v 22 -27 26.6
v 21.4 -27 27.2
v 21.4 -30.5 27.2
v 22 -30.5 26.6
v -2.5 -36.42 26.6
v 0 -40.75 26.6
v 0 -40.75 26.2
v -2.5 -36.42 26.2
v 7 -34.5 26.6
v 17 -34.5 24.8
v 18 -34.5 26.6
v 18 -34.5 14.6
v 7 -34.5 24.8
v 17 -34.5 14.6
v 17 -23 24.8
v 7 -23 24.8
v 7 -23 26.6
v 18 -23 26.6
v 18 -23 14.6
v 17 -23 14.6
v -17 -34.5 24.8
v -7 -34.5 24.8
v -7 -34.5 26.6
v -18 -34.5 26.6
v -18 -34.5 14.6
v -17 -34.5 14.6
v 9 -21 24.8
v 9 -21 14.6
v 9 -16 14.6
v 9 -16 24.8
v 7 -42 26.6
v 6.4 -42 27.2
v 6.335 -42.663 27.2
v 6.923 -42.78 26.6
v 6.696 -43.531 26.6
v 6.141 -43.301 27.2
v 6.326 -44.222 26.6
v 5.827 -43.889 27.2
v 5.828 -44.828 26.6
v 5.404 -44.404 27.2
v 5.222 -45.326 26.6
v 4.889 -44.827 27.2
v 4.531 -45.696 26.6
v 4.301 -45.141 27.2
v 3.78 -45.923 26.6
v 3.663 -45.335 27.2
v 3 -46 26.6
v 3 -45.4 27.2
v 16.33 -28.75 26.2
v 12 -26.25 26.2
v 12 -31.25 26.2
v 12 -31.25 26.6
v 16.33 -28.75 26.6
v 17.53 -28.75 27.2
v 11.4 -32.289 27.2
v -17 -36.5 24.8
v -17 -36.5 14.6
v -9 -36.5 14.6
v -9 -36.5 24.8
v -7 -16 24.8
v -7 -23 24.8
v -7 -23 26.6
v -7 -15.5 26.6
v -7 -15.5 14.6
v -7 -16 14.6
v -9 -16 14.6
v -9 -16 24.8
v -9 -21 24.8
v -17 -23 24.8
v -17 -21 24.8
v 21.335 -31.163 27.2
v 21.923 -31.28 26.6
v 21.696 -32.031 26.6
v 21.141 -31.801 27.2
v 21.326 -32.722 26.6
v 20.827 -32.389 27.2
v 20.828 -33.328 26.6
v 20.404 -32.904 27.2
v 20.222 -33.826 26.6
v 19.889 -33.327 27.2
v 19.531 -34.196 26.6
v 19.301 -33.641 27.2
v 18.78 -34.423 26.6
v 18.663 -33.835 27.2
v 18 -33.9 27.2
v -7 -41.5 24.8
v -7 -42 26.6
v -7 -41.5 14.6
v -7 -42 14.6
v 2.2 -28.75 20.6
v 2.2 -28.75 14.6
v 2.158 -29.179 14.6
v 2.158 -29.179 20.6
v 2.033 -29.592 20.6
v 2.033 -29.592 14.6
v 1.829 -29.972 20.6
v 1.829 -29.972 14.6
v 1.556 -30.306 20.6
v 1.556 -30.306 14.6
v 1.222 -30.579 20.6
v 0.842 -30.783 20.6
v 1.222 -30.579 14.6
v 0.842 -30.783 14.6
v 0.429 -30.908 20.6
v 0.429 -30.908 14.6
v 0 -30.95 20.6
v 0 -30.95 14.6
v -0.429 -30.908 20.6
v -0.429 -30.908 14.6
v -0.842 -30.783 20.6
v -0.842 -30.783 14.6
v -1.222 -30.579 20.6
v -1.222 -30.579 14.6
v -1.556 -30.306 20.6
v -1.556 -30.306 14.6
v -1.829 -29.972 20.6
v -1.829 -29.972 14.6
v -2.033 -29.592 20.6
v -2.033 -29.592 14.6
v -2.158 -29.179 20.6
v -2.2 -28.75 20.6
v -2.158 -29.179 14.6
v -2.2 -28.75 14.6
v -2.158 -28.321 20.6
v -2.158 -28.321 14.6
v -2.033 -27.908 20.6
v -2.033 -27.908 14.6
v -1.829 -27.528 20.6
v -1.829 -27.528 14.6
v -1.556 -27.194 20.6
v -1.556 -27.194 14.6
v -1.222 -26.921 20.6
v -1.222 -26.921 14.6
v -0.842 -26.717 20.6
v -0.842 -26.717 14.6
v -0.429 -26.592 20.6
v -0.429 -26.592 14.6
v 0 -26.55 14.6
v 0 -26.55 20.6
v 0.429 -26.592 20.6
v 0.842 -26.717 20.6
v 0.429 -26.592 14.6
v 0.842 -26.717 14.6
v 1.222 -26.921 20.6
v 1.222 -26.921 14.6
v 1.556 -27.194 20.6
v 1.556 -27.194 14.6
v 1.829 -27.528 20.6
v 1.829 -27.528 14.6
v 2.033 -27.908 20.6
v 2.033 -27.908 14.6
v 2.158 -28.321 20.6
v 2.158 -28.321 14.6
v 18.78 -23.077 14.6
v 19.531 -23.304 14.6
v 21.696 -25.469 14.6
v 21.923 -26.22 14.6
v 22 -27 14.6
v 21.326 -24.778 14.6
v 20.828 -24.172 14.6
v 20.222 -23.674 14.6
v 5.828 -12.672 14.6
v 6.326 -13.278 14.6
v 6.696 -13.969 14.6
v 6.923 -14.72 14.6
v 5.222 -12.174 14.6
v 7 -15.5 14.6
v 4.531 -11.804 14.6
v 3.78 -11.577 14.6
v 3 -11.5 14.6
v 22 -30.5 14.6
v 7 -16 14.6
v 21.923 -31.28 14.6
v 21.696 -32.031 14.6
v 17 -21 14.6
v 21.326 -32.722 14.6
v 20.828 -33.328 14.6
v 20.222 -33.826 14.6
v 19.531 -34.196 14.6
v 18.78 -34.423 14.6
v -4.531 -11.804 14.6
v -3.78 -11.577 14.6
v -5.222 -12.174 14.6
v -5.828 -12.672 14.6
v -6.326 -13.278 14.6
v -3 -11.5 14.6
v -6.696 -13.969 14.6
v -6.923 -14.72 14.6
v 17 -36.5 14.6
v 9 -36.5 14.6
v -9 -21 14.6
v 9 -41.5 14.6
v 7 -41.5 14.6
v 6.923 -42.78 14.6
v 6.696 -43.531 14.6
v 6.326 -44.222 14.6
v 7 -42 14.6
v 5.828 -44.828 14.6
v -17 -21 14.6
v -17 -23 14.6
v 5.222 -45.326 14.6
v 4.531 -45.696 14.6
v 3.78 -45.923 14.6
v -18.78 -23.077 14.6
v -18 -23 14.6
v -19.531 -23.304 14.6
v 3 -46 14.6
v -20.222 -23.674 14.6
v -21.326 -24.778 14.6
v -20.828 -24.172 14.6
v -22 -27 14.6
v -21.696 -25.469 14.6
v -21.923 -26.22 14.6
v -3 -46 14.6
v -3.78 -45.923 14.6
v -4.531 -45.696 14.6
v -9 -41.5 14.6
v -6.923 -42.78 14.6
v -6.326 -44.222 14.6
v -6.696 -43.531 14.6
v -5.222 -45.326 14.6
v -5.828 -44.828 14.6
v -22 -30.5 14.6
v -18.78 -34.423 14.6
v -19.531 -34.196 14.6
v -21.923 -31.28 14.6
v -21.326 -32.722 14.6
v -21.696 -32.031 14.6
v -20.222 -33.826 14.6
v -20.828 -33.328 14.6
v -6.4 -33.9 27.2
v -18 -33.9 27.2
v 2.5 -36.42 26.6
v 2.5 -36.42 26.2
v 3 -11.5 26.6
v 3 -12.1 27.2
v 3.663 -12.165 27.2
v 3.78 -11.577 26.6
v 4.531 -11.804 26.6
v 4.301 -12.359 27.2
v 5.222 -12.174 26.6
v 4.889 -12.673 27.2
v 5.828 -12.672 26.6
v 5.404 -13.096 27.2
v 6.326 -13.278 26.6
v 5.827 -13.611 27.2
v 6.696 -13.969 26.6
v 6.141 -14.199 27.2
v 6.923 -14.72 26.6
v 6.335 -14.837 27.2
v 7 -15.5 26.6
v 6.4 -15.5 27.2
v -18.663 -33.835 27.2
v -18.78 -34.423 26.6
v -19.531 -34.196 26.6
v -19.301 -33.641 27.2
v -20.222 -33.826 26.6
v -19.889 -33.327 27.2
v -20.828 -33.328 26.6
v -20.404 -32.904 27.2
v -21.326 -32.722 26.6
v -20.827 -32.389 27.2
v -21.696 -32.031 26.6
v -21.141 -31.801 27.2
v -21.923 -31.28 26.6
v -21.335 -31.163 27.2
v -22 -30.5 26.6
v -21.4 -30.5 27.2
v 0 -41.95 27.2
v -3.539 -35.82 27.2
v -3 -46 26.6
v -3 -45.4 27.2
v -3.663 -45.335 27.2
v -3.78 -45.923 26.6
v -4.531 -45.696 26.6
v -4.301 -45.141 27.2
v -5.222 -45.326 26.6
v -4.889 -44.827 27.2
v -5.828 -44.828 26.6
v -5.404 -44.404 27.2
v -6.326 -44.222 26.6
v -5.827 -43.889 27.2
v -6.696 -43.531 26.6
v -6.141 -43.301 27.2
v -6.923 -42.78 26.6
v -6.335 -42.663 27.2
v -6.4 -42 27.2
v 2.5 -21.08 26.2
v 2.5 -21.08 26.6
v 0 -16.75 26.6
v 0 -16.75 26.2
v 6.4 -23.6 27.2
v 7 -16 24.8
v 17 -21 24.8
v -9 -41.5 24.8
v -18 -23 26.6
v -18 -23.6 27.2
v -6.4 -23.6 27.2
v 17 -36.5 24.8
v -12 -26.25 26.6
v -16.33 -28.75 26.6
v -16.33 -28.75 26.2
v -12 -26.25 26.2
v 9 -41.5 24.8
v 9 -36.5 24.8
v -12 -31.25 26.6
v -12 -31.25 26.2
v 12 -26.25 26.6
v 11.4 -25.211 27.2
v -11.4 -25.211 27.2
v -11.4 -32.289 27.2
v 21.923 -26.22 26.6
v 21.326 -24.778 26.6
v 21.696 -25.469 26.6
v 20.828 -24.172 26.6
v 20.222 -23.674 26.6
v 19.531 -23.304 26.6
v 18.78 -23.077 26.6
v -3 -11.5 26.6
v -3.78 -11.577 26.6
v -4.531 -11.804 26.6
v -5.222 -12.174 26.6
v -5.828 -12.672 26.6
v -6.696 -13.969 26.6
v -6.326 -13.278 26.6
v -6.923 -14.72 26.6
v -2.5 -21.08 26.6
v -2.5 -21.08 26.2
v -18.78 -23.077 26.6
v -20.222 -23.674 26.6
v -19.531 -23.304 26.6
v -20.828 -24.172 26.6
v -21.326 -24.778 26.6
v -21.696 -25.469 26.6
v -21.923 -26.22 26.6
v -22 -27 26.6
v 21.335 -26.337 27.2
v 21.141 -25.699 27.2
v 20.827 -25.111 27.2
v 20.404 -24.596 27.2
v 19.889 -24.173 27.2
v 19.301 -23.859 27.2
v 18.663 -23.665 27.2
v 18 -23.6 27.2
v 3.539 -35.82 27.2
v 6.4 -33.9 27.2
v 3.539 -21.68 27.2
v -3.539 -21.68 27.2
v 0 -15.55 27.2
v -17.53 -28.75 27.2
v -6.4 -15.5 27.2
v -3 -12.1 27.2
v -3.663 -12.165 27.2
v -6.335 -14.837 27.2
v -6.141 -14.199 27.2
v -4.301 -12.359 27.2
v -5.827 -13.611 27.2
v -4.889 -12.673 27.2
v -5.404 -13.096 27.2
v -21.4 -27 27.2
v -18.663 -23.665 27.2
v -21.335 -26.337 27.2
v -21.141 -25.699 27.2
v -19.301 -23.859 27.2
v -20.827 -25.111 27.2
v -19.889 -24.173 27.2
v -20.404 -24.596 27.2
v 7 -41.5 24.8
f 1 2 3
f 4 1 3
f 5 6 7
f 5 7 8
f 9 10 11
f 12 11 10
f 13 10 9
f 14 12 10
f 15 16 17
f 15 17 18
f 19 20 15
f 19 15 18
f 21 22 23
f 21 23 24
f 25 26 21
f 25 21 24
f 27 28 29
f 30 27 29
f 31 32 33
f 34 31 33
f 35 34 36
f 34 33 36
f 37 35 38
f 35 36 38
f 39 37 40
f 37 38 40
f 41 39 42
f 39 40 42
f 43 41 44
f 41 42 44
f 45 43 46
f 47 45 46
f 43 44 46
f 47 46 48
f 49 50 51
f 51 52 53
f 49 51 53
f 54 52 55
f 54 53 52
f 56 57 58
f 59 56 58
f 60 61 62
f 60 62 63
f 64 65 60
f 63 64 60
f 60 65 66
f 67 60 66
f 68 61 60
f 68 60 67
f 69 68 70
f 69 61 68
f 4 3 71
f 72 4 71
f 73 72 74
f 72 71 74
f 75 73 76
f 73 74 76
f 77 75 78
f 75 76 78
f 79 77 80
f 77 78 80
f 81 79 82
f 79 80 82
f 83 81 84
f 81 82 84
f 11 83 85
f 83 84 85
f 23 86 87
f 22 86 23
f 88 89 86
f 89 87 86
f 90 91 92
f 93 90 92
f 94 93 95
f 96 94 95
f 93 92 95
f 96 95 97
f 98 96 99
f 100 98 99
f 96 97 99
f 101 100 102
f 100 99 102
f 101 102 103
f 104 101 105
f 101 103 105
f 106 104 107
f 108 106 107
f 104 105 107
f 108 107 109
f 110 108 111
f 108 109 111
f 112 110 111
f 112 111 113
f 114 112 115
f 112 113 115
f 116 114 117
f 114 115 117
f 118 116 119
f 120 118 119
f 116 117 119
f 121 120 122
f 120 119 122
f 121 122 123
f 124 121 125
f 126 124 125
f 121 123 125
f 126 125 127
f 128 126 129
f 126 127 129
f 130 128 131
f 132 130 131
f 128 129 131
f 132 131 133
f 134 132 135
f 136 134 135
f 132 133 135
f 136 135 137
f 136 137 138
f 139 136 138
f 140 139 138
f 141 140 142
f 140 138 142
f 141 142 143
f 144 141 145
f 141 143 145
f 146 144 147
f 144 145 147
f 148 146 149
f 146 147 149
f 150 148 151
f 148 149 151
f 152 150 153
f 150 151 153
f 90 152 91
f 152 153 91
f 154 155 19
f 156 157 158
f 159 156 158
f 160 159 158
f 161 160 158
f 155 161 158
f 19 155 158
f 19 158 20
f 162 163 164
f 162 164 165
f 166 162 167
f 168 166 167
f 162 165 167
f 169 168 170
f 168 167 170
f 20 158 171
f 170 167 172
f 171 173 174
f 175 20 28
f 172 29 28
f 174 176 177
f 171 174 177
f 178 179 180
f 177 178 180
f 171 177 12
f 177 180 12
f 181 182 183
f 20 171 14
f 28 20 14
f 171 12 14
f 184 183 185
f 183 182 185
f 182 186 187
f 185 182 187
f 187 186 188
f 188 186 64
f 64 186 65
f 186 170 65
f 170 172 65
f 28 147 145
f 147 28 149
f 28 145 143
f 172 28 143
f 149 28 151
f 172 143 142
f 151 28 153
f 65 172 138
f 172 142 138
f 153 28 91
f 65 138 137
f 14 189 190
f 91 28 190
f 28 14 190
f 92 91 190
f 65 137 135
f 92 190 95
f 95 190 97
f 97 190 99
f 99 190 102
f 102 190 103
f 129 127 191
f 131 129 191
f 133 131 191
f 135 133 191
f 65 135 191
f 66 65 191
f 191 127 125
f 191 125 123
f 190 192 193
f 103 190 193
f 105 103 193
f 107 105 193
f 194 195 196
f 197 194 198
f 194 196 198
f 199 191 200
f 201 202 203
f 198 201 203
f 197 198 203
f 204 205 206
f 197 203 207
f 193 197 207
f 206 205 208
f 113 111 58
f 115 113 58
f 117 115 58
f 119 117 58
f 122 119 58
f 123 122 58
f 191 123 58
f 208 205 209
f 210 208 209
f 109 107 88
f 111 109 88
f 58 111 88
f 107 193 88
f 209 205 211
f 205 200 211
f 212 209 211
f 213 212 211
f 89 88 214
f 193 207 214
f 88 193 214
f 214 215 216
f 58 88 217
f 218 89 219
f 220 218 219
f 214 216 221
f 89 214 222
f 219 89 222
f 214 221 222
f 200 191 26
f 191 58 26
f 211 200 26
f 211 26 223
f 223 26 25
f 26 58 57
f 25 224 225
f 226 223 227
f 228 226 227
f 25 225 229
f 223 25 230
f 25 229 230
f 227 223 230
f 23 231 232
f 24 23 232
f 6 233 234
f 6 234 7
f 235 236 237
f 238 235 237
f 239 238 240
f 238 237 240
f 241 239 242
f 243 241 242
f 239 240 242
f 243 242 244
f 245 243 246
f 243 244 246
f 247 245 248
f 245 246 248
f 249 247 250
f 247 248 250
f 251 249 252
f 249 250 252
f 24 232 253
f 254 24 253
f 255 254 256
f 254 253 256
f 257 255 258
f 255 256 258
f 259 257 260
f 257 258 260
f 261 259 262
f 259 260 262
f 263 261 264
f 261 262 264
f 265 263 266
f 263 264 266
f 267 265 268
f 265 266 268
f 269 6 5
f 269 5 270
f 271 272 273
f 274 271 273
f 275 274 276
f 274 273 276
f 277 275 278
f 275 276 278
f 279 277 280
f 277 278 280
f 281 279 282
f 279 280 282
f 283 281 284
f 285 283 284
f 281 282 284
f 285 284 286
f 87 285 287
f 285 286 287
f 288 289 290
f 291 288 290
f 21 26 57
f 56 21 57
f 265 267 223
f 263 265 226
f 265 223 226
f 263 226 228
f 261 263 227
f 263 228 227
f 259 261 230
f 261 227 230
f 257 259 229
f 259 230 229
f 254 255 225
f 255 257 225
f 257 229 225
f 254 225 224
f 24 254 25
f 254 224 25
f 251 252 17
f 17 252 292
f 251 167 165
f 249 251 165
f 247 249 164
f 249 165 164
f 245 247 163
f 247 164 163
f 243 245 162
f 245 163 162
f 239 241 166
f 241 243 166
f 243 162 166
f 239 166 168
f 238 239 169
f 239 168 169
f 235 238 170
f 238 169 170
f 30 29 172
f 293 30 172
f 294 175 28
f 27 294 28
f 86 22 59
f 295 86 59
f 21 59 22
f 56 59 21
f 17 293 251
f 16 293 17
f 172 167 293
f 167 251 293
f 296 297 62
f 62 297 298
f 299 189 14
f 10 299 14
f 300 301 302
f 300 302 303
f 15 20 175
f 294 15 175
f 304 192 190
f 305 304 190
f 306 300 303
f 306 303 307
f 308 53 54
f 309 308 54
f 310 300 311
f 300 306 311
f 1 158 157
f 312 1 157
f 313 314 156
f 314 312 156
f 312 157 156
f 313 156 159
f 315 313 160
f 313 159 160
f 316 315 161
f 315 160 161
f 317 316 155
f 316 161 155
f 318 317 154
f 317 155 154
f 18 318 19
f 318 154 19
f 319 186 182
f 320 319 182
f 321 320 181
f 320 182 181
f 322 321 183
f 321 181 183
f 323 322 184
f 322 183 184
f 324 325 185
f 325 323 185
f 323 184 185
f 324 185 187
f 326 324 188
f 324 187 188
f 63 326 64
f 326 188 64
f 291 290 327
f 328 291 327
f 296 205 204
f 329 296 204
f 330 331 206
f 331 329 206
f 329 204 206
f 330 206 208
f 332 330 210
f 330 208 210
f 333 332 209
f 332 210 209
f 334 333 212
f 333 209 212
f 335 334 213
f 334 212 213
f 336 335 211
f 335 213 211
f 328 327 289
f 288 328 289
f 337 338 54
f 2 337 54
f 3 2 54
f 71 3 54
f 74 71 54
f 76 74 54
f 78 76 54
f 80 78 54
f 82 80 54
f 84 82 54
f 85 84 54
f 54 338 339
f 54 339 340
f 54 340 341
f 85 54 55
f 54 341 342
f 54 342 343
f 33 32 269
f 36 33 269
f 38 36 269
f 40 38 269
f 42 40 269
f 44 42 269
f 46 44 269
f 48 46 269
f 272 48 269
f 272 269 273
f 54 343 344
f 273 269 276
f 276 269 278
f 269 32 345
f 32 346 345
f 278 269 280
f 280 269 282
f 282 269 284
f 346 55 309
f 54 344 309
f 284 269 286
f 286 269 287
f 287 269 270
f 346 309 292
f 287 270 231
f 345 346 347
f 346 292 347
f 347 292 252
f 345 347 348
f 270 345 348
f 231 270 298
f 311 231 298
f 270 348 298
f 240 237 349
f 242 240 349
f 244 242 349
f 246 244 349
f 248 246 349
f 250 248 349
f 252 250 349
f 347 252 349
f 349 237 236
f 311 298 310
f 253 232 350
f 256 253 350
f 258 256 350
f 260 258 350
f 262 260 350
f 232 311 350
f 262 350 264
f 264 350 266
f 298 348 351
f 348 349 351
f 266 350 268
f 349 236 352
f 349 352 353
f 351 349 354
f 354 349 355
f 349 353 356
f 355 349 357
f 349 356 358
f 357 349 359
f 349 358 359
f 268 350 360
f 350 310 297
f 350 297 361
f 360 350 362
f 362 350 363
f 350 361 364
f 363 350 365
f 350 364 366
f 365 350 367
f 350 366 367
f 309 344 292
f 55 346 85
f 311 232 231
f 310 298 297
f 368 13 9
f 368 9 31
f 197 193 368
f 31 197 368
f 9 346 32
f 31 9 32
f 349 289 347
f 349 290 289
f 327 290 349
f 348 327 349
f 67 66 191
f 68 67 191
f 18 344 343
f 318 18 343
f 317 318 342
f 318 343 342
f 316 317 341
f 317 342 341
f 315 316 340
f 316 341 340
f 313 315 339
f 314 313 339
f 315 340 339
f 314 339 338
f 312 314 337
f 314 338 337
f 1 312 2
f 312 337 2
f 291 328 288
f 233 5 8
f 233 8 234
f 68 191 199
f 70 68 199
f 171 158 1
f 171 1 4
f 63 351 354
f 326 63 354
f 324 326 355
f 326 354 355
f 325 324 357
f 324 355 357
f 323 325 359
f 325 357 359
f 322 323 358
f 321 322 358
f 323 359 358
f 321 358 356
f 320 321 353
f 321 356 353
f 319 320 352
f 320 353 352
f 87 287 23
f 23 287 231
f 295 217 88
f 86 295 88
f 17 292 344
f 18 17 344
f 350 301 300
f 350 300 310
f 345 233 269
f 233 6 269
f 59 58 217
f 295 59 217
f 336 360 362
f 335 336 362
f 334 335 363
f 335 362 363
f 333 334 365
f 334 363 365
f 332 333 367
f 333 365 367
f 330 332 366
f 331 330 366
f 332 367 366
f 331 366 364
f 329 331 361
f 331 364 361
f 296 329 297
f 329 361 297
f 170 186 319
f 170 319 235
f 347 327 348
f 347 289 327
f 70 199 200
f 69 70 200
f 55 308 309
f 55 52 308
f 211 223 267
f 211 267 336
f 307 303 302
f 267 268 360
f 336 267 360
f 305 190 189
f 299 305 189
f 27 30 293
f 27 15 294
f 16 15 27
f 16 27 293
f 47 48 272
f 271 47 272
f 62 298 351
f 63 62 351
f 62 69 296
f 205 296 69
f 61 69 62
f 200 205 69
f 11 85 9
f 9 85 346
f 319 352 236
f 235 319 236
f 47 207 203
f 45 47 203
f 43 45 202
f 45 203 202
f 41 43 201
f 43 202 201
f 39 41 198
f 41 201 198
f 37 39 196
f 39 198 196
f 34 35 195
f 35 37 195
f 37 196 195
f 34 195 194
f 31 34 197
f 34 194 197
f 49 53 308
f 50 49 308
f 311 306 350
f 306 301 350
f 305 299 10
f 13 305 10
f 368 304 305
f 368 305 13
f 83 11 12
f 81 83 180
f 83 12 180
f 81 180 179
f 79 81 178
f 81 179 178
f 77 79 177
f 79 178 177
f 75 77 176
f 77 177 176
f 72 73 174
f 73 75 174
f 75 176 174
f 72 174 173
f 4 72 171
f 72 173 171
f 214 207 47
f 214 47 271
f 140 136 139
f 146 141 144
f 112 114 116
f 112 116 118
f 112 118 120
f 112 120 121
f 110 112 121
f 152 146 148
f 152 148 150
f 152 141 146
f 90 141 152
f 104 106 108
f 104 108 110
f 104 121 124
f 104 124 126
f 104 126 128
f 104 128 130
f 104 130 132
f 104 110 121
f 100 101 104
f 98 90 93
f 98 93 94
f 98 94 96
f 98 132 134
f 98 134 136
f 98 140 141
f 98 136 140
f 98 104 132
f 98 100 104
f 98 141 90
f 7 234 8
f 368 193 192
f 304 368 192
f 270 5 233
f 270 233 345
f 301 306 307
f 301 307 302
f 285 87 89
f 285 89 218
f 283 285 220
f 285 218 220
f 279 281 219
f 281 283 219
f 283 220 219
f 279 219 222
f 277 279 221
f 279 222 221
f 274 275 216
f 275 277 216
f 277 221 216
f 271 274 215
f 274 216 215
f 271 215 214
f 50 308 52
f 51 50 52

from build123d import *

# Parameters (mm, degrees)
PAD025_DEPTH    = 12.6
PAD026_DEPTH    = 10.2
POCKET012_DEPTH = 1
SKETCH058_R     = 2.2
POCKET022_DEPTH = 6
CHAMFER002_SIZE = 0.6


with BuildPart() as part:
    # Sketch039 → Pad025 (new body)
    with BuildSketch(Plane.XY.offset(14.6)):
        with BuildLine():
            Line((-3, -11.5), (3, -11.5))
            ThreePointArc((7, -15.5), (5.828427, -12.671573), (3, -11.5))
            Line((7, -15.5), (7, -23))
            Line((7, -23), (18, -23))
            ThreePointArc((22, -27), (20.828427, -24.171573), (18, -23))
            Line((22, -27), (22, -30.5))
            ThreePointArc((18, -34.5), (20.828427, -33.328427), (22, -30.5))
            Line((18, -34.5), (7, -34.5))
            Line((7, -34.5), (7, -42))
            ThreePointArc((3, -46), (5.828427, -44.828427), (7, -42))
            Line((3, -46), (-3, -46))
            ThreePointArc((-7, -42), (-5.828427, -44.828427), (-3, -46))
            Line((-7, -42), (-7, -34.5))
            Line((-7, -34.5), (-18, -34.5))
            ThreePointArc((-22, -30.5), (-20.828427, -33.328427), (-18, -34.5))
            Line((-22, -30.5), (-22, -27))
            ThreePointArc((-18, -23), (-20.828427, -24.171573), (-22, -27))
            Line((-18, -23), (-7, -23))
            Line((-7, -23), (-7, -15.5))
            ThreePointArc((-3, -11.5), (-5.828427, -12.671573), (-7, -15.5))
        make_face()
    extrude(amount=PAD025_DEPTH)

    # Sketch041 (on Face21 of Pad025) → Pad026 (join)
    with BuildSketch(Plane(origin=(0, 0, 14.6), x_dir=(1, 0, 0), z_dir=(0, 0, -1))):
        Polygon((-17, 36.5), (-9, 36.5), (-9, 41.5), (9, 41.5), (9, 36.5), (17, 36.5), (17, 21), (9, 21), (9, 16), (-9, 16), (-9, 21), (-17, 21), align=None)
    extrude(amount=-PAD026_DEPTH)

    # Sketch042 (on Face5 of Pad026) → Pocket012 (cut)
    with BuildSketch(Plane.XY.offset(27.2)):
        Polygon((0, -16.75), (-2.5, -21.080127), (2.5, -21.080127), align=None)
        Polygon((-2.5, -36.419873), (2.5, -36.419873), (0, -40.75), align=None)
        Polygon((-16.330127, -28.75), (-12, -26.25), (-12, -31.25), align=None)
        Polygon((12, -26.25), (12, -31.25), (16.330127, -28.75), align=None)
    extrude(amount=-POCKET012_DEPTH, mode=Mode.SUBTRACT)

    # Sketch058 (on Face8 of Pocket012) → Pocket022 (cut)
    with BuildSketch(Plane(origin=(0, 0, 14.6), x_dir=(1, 0, 0), z_dir=(0, 0, -1))):
        with Locations((0, 28.75)):
            Circle(SKETCH058_R)
    extrude(amount=-POCKET022_DEPTH, mode=Mode.SUBTRACT)

    # Chamfer002
    chamfer002_edges = [part.edges().sort_by_distance(p)[0] for p in [
        (-14.165064, -30, 27.2),
        (-14.165064, -27.5, 27.2),
        (-12, -28.75, 27.2),
        (12, -28.75, 27.2),
        (0, -11.5, 27.2),
        (-5.828427, -12.671573, 27.2),
        (5.828427, -12.671573, 27.2),
        (-7, -19.25, 27.2),
        (7, -19.25, 27.2),
        (-12.5, -23, 27.2),
        (12.5, -23, 27.2),
        (-20.828427, -24.171573, 27.2),
        (20.828427, -24.171573, 27.2),
        (-22, -28.75, 27.2),
        (22, -28.75, 27.2),
        (-20.828427, -33.328427, 27.2),
        (20.828427, -33.328427, 27.2),
        (-12.5, -34.5, 27.2),
        (12.5, -34.5, 27.2),
        (-7, -38.25, 27.2),
        (7, -38.25, 27.2),
        (-5.828427, -44.828427, 27.2),
        (5.828427, -44.828427, 27.2),
        (0, -46, 27.2),
        (14.165064, -27.5, 27.2),
        (14.165064, -30, 27.2),
        (1.25, -18.915064, 27.2),
        (0, -21.080127, 27.2),
        (-1.25, -18.915064, 27.2),
        (0, -36.419873, 27.2),
        (1.25, -38.584936, 27.2),
        (-1.25, -38.584936, 27.2),
    ]]
    chamfer(chamfer002_edges, length=CHAMFER002_SIZE)


solid = part.part
